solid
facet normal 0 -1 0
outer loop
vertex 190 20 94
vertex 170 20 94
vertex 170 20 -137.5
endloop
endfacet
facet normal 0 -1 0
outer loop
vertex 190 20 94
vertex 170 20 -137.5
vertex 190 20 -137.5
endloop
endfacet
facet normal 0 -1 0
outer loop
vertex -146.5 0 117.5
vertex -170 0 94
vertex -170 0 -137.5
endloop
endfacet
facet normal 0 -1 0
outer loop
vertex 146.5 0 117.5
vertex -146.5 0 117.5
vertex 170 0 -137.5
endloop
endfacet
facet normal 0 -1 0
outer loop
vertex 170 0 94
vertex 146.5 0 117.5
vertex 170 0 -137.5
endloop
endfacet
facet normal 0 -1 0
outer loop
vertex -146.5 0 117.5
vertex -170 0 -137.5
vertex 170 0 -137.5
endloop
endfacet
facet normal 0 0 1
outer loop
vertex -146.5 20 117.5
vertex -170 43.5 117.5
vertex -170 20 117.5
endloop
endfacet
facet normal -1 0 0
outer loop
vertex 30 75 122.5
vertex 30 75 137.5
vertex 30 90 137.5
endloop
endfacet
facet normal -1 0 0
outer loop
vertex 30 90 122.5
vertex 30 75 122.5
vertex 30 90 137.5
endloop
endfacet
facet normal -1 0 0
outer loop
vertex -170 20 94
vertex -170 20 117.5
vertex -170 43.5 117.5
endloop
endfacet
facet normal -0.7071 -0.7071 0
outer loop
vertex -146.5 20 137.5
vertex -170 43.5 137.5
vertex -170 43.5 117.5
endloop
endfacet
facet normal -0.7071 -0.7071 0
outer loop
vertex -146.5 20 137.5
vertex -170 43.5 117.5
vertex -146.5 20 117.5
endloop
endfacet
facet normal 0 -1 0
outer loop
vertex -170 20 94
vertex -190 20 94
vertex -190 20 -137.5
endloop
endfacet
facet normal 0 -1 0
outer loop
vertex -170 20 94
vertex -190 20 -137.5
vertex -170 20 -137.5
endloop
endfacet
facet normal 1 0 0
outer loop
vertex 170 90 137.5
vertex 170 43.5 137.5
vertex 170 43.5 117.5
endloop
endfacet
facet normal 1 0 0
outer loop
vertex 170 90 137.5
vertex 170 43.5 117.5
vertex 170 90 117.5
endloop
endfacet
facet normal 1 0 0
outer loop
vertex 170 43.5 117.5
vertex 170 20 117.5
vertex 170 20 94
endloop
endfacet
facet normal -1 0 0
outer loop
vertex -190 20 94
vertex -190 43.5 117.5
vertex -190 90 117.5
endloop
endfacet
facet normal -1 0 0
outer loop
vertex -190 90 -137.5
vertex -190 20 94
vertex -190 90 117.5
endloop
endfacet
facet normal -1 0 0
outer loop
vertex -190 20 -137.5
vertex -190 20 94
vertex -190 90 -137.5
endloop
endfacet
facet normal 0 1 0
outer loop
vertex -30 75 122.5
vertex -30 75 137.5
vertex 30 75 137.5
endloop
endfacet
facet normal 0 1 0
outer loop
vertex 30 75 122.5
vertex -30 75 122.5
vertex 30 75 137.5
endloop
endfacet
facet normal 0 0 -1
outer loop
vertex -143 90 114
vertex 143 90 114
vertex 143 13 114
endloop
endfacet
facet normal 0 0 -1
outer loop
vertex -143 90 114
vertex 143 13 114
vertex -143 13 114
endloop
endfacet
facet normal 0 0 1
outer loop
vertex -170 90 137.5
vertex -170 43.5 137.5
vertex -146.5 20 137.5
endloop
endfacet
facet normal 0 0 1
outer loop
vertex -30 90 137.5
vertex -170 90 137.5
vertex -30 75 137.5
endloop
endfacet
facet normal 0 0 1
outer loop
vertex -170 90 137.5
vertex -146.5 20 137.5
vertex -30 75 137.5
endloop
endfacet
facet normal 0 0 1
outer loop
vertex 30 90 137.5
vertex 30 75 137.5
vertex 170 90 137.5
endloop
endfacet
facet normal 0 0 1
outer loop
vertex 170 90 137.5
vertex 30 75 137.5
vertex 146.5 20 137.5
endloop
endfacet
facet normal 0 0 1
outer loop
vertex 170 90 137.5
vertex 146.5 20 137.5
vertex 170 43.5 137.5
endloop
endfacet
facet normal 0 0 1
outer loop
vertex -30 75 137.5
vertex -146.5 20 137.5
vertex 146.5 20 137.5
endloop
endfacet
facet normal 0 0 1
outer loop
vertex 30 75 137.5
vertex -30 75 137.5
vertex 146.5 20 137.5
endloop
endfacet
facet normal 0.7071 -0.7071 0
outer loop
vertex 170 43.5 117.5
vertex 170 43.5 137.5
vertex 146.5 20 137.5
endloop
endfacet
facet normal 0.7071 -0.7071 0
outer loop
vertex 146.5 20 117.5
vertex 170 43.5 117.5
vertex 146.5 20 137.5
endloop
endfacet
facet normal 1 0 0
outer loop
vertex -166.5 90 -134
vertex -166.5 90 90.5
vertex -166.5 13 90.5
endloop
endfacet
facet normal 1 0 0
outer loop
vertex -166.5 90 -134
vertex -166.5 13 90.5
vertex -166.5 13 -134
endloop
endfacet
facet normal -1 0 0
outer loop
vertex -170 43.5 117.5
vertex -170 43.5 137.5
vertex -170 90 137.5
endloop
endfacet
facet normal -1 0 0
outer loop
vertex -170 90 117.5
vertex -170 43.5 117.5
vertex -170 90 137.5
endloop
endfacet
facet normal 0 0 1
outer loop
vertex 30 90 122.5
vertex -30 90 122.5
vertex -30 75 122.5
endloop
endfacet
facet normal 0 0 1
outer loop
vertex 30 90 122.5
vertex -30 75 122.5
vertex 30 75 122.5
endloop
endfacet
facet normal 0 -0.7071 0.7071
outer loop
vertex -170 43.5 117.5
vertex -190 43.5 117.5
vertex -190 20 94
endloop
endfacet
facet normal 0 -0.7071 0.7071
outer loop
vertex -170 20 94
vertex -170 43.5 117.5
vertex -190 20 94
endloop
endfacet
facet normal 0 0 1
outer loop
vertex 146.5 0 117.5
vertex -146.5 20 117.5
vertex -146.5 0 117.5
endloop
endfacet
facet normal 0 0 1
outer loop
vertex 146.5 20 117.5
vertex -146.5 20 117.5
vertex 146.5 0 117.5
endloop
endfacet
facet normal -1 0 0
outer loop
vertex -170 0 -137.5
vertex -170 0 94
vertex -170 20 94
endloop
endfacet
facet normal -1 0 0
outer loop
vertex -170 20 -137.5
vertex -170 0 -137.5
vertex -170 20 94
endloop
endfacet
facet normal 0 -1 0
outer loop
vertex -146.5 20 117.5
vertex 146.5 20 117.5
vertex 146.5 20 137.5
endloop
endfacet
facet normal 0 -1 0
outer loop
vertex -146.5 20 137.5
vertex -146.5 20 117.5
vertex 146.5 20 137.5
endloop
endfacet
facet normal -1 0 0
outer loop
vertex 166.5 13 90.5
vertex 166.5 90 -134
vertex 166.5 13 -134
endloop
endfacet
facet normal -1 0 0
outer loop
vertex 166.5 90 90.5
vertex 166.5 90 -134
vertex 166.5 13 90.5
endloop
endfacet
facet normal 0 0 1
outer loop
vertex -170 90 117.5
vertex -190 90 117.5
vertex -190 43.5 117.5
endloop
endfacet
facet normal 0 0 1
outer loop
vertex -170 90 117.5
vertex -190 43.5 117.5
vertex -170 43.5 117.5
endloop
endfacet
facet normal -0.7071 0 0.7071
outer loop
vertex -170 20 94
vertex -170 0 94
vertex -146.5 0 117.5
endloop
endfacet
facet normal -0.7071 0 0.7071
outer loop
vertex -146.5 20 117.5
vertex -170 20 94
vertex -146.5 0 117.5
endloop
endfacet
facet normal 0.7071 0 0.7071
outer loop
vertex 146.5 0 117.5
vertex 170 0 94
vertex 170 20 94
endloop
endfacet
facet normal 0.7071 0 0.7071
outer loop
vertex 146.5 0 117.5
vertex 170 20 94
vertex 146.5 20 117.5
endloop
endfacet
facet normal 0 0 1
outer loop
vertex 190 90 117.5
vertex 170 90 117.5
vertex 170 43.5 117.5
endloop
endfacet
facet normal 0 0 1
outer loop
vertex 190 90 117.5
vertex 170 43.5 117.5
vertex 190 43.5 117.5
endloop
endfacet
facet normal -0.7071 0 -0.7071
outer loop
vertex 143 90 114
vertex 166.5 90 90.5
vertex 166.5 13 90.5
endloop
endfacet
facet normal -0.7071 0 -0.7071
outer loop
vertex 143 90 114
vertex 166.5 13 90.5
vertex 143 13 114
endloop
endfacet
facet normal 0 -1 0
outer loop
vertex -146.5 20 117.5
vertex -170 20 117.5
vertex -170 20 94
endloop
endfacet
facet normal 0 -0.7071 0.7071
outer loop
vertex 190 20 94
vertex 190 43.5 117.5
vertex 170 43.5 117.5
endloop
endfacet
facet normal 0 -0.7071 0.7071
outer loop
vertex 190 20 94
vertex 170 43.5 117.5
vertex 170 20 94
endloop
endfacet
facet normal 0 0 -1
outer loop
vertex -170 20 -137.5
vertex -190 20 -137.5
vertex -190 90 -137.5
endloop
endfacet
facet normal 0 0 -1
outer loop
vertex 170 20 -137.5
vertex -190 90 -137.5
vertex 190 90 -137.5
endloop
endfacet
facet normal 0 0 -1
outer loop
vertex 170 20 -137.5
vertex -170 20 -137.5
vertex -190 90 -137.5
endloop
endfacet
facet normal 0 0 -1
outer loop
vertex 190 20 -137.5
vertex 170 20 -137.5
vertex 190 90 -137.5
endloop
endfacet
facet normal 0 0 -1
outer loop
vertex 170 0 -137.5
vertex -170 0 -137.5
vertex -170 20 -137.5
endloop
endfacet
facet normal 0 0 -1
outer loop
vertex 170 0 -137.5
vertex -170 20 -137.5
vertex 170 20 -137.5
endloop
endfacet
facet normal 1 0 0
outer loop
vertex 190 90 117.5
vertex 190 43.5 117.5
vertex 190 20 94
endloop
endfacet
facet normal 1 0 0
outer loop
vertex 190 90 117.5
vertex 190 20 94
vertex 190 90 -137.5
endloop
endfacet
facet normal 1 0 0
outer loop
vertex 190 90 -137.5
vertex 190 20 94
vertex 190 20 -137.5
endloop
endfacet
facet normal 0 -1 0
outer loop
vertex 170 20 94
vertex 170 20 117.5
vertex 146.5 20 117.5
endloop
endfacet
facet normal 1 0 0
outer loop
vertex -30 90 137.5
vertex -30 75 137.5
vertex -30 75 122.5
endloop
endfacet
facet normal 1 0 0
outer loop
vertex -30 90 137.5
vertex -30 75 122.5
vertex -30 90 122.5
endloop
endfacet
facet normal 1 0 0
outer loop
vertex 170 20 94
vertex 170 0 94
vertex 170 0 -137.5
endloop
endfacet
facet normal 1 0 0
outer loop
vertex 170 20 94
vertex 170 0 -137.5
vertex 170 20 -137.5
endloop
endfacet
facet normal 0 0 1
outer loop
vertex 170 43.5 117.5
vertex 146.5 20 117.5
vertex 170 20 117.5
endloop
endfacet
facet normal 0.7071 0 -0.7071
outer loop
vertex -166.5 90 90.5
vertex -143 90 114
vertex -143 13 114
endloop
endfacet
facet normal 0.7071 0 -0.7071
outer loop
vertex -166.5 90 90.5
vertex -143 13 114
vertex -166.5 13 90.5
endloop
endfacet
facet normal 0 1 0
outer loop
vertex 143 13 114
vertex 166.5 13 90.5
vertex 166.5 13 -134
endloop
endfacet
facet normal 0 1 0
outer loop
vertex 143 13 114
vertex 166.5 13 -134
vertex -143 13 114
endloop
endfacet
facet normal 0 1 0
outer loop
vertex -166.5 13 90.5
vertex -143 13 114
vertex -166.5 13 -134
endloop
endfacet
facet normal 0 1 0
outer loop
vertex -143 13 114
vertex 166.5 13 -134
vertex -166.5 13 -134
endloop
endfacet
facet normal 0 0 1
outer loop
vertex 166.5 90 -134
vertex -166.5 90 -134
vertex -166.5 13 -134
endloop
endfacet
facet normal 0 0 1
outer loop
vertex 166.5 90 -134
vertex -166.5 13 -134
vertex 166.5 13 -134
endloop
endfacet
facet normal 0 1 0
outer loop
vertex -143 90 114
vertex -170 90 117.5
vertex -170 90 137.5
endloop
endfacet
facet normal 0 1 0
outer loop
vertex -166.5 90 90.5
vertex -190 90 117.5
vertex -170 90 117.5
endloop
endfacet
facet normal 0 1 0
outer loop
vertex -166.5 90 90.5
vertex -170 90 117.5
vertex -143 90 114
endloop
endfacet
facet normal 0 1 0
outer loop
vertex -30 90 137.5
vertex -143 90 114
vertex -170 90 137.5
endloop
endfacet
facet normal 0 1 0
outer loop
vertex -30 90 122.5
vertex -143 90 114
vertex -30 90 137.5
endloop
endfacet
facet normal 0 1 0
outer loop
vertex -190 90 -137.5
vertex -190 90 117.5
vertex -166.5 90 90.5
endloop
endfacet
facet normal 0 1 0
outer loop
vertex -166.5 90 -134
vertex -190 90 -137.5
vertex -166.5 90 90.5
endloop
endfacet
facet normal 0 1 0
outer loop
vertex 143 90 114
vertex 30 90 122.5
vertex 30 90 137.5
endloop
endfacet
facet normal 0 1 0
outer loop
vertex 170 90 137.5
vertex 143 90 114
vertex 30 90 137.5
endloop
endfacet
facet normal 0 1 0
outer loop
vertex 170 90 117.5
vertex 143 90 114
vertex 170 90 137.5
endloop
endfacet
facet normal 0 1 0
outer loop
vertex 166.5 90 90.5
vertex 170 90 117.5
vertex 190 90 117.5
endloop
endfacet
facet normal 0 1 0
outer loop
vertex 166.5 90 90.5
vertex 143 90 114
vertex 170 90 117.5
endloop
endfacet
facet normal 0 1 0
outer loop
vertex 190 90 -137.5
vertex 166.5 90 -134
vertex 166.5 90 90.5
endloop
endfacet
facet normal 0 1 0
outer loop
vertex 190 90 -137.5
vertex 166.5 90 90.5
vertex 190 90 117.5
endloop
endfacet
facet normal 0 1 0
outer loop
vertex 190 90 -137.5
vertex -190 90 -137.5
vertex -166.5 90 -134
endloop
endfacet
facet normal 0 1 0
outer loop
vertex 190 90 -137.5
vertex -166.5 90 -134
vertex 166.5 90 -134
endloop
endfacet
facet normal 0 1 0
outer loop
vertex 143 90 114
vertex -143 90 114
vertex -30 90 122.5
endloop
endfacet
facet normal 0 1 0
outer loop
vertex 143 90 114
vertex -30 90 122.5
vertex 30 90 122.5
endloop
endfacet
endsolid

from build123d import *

# Parameters (mm, degrees)
SKETCH_1_W          = 380
SKETCH_1_H          = 275
EXTRUDE_1_DEPTH     = 90
SKETCH_2_W          = 20
SKETCH_2_H          = 20
CUT_EXTRUDE_1_DEPTH = 90
SKETCH_4_W          = 20
SKETCH_4_H          = 20
CUT_EXTRUDE_3_DEPTH = 255
SKETCH_5_W          = 20
SKETCH_5_H          = 20
CUT_EXTRUDE_4_DEPTH = 340
CUT_EXTRUDE_5_DEPTH = 77
SKETCH_7_W          = 60
SKETCH_7_H          = 15
CUT_EXTRUDE_6_DEPTH = 15
CUT_EXTRUDE_7_DEPTH = 20
CUT_EXTRUDE_8_DEPTH = 20
CUT_EXTRUDE_9_DEPTH = 20


with BuildPart() as part:
    # 草圖1 → 填料-伸長1 (new body)
    with BuildSketch(Plane(origin=(0, 0, 0), x_dir=(1, 0, 0), z_dir=(0, 1, 0))):
        Rectangle(SKETCH_1_W, SKETCH_1_H)
    extrude(amount=EXTRUDE_1_DEPTH)

    # 草圖2 → 除料-伸長1 (cut)
    with BuildSketch(Plane(origin=(0, 90, 0), x_dir=(1, 0, 0), z_dir=(0, 1, 0))):
        with Locations((-180, -127.5)):
            Rectangle(SKETCH_2_W, SKETCH_2_H)
        with Locations((180, -127.5)):
            Rectangle(SKETCH_2_W, SKETCH_2_H)
    extrude(amount=-CUT_EXTRUDE_1_DEPTH, mode=Mode.SUBTRACT)

    # 草圖4 → 除料-伸長3 (cut)
    with BuildSketch(Plane.XY.offset(117.5)):
        with Locations((-180, 10)):
            Rectangle(SKETCH_4_W, SKETCH_4_H)
        with Locations((180, 10)):
            Rectangle(SKETCH_4_W, SKETCH_4_H)
    extrude(amount=-CUT_EXTRUDE_3_DEPTH, mode=Mode.SUBTRACT)

    # 草圖5 → 除料-伸長4 (cut)
    with BuildSketch(Plane.ZY.offset(170)):
        with Locations((127.5, 10)):
            Rectangle(SKETCH_5_W, SKETCH_5_H)
    extrude(amount=-CUT_EXTRUDE_4_DEPTH, mode=Mode.SUBTRACT)

    # 草圖6 → 除料-伸長5 (cut)
    with BuildSketch(Plane(origin=(0, 90, 0), x_dir=(1, 0, 0), z_dir=(0, 1, 0))):
        Polygon((-166.5, 134), (166.5, 134), (166.5, -90.5), (143, -114), (-143, -114), (-166.5, -90.5), align=None)
    extrude(amount=-CUT_EXTRUDE_5_DEPTH, mode=Mode.SUBTRACT)

    # 草圖7 → 除料-伸長6 (cut)
    with BuildSketch(Plane.XY.offset(137.5)):
        with Locations((0, 82.5)):
            Rectangle(SKETCH_7_W, SKETCH_7_H)
    extrude(amount=-CUT_EXTRUDE_6_DEPTH, mode=Mode.SUBTRACT)

    # 草圖9 → 除料-伸長7 (cut)
    with BuildSketch(Plane.XY.offset(137.5)):
        Polygon((-170, 20), (-170, 43.5), (-146.5, 20), align=None)
        Polygon((170, 43.5), (146.5, 20), (170, 20), align=None)
    extrude(amount=-CUT_EXTRUDE_7_DEPTH, mode=Mode.SUBTRACT)

    # 草圖10 → 除料-伸長8 (cut)
    with BuildSketch(Plane(origin=(190, 0, 0), x_dir=(0, 0, -1), z_dir=(1, 0, 0))):
        Polygon((-94, 20), (-117.5, 20), (-117.5, 43.5), align=None)
    cut_extrude_8 = extrude(amount=-CUT_EXTRUDE_8_DEPTH, mode=Mode.SUBTRACT)

    # 鏡射1: 除料-伸長8 across plane
    add(cut_extrude_8.mirror(Plane(origin=(0, 0, 0), x_dir=(0, 0, 1), z_dir=(1, 0, 0))), mode=Mode.SUBTRACT)

    # 草圖11 → 除料-伸長9 (cut)
    with BuildSketch(Plane.XZ):
        Polygon((-146.5, 117.5), (-170, 117.5), (-170, 94), align=None)
        Polygon((170, 94), (146.5, 117.5), (170, 117.5), align=None)
    extrude(amount=-CUT_EXTRUDE_9_DEPTH, mode=Mode.SUBTRACT)


solid = part.part
